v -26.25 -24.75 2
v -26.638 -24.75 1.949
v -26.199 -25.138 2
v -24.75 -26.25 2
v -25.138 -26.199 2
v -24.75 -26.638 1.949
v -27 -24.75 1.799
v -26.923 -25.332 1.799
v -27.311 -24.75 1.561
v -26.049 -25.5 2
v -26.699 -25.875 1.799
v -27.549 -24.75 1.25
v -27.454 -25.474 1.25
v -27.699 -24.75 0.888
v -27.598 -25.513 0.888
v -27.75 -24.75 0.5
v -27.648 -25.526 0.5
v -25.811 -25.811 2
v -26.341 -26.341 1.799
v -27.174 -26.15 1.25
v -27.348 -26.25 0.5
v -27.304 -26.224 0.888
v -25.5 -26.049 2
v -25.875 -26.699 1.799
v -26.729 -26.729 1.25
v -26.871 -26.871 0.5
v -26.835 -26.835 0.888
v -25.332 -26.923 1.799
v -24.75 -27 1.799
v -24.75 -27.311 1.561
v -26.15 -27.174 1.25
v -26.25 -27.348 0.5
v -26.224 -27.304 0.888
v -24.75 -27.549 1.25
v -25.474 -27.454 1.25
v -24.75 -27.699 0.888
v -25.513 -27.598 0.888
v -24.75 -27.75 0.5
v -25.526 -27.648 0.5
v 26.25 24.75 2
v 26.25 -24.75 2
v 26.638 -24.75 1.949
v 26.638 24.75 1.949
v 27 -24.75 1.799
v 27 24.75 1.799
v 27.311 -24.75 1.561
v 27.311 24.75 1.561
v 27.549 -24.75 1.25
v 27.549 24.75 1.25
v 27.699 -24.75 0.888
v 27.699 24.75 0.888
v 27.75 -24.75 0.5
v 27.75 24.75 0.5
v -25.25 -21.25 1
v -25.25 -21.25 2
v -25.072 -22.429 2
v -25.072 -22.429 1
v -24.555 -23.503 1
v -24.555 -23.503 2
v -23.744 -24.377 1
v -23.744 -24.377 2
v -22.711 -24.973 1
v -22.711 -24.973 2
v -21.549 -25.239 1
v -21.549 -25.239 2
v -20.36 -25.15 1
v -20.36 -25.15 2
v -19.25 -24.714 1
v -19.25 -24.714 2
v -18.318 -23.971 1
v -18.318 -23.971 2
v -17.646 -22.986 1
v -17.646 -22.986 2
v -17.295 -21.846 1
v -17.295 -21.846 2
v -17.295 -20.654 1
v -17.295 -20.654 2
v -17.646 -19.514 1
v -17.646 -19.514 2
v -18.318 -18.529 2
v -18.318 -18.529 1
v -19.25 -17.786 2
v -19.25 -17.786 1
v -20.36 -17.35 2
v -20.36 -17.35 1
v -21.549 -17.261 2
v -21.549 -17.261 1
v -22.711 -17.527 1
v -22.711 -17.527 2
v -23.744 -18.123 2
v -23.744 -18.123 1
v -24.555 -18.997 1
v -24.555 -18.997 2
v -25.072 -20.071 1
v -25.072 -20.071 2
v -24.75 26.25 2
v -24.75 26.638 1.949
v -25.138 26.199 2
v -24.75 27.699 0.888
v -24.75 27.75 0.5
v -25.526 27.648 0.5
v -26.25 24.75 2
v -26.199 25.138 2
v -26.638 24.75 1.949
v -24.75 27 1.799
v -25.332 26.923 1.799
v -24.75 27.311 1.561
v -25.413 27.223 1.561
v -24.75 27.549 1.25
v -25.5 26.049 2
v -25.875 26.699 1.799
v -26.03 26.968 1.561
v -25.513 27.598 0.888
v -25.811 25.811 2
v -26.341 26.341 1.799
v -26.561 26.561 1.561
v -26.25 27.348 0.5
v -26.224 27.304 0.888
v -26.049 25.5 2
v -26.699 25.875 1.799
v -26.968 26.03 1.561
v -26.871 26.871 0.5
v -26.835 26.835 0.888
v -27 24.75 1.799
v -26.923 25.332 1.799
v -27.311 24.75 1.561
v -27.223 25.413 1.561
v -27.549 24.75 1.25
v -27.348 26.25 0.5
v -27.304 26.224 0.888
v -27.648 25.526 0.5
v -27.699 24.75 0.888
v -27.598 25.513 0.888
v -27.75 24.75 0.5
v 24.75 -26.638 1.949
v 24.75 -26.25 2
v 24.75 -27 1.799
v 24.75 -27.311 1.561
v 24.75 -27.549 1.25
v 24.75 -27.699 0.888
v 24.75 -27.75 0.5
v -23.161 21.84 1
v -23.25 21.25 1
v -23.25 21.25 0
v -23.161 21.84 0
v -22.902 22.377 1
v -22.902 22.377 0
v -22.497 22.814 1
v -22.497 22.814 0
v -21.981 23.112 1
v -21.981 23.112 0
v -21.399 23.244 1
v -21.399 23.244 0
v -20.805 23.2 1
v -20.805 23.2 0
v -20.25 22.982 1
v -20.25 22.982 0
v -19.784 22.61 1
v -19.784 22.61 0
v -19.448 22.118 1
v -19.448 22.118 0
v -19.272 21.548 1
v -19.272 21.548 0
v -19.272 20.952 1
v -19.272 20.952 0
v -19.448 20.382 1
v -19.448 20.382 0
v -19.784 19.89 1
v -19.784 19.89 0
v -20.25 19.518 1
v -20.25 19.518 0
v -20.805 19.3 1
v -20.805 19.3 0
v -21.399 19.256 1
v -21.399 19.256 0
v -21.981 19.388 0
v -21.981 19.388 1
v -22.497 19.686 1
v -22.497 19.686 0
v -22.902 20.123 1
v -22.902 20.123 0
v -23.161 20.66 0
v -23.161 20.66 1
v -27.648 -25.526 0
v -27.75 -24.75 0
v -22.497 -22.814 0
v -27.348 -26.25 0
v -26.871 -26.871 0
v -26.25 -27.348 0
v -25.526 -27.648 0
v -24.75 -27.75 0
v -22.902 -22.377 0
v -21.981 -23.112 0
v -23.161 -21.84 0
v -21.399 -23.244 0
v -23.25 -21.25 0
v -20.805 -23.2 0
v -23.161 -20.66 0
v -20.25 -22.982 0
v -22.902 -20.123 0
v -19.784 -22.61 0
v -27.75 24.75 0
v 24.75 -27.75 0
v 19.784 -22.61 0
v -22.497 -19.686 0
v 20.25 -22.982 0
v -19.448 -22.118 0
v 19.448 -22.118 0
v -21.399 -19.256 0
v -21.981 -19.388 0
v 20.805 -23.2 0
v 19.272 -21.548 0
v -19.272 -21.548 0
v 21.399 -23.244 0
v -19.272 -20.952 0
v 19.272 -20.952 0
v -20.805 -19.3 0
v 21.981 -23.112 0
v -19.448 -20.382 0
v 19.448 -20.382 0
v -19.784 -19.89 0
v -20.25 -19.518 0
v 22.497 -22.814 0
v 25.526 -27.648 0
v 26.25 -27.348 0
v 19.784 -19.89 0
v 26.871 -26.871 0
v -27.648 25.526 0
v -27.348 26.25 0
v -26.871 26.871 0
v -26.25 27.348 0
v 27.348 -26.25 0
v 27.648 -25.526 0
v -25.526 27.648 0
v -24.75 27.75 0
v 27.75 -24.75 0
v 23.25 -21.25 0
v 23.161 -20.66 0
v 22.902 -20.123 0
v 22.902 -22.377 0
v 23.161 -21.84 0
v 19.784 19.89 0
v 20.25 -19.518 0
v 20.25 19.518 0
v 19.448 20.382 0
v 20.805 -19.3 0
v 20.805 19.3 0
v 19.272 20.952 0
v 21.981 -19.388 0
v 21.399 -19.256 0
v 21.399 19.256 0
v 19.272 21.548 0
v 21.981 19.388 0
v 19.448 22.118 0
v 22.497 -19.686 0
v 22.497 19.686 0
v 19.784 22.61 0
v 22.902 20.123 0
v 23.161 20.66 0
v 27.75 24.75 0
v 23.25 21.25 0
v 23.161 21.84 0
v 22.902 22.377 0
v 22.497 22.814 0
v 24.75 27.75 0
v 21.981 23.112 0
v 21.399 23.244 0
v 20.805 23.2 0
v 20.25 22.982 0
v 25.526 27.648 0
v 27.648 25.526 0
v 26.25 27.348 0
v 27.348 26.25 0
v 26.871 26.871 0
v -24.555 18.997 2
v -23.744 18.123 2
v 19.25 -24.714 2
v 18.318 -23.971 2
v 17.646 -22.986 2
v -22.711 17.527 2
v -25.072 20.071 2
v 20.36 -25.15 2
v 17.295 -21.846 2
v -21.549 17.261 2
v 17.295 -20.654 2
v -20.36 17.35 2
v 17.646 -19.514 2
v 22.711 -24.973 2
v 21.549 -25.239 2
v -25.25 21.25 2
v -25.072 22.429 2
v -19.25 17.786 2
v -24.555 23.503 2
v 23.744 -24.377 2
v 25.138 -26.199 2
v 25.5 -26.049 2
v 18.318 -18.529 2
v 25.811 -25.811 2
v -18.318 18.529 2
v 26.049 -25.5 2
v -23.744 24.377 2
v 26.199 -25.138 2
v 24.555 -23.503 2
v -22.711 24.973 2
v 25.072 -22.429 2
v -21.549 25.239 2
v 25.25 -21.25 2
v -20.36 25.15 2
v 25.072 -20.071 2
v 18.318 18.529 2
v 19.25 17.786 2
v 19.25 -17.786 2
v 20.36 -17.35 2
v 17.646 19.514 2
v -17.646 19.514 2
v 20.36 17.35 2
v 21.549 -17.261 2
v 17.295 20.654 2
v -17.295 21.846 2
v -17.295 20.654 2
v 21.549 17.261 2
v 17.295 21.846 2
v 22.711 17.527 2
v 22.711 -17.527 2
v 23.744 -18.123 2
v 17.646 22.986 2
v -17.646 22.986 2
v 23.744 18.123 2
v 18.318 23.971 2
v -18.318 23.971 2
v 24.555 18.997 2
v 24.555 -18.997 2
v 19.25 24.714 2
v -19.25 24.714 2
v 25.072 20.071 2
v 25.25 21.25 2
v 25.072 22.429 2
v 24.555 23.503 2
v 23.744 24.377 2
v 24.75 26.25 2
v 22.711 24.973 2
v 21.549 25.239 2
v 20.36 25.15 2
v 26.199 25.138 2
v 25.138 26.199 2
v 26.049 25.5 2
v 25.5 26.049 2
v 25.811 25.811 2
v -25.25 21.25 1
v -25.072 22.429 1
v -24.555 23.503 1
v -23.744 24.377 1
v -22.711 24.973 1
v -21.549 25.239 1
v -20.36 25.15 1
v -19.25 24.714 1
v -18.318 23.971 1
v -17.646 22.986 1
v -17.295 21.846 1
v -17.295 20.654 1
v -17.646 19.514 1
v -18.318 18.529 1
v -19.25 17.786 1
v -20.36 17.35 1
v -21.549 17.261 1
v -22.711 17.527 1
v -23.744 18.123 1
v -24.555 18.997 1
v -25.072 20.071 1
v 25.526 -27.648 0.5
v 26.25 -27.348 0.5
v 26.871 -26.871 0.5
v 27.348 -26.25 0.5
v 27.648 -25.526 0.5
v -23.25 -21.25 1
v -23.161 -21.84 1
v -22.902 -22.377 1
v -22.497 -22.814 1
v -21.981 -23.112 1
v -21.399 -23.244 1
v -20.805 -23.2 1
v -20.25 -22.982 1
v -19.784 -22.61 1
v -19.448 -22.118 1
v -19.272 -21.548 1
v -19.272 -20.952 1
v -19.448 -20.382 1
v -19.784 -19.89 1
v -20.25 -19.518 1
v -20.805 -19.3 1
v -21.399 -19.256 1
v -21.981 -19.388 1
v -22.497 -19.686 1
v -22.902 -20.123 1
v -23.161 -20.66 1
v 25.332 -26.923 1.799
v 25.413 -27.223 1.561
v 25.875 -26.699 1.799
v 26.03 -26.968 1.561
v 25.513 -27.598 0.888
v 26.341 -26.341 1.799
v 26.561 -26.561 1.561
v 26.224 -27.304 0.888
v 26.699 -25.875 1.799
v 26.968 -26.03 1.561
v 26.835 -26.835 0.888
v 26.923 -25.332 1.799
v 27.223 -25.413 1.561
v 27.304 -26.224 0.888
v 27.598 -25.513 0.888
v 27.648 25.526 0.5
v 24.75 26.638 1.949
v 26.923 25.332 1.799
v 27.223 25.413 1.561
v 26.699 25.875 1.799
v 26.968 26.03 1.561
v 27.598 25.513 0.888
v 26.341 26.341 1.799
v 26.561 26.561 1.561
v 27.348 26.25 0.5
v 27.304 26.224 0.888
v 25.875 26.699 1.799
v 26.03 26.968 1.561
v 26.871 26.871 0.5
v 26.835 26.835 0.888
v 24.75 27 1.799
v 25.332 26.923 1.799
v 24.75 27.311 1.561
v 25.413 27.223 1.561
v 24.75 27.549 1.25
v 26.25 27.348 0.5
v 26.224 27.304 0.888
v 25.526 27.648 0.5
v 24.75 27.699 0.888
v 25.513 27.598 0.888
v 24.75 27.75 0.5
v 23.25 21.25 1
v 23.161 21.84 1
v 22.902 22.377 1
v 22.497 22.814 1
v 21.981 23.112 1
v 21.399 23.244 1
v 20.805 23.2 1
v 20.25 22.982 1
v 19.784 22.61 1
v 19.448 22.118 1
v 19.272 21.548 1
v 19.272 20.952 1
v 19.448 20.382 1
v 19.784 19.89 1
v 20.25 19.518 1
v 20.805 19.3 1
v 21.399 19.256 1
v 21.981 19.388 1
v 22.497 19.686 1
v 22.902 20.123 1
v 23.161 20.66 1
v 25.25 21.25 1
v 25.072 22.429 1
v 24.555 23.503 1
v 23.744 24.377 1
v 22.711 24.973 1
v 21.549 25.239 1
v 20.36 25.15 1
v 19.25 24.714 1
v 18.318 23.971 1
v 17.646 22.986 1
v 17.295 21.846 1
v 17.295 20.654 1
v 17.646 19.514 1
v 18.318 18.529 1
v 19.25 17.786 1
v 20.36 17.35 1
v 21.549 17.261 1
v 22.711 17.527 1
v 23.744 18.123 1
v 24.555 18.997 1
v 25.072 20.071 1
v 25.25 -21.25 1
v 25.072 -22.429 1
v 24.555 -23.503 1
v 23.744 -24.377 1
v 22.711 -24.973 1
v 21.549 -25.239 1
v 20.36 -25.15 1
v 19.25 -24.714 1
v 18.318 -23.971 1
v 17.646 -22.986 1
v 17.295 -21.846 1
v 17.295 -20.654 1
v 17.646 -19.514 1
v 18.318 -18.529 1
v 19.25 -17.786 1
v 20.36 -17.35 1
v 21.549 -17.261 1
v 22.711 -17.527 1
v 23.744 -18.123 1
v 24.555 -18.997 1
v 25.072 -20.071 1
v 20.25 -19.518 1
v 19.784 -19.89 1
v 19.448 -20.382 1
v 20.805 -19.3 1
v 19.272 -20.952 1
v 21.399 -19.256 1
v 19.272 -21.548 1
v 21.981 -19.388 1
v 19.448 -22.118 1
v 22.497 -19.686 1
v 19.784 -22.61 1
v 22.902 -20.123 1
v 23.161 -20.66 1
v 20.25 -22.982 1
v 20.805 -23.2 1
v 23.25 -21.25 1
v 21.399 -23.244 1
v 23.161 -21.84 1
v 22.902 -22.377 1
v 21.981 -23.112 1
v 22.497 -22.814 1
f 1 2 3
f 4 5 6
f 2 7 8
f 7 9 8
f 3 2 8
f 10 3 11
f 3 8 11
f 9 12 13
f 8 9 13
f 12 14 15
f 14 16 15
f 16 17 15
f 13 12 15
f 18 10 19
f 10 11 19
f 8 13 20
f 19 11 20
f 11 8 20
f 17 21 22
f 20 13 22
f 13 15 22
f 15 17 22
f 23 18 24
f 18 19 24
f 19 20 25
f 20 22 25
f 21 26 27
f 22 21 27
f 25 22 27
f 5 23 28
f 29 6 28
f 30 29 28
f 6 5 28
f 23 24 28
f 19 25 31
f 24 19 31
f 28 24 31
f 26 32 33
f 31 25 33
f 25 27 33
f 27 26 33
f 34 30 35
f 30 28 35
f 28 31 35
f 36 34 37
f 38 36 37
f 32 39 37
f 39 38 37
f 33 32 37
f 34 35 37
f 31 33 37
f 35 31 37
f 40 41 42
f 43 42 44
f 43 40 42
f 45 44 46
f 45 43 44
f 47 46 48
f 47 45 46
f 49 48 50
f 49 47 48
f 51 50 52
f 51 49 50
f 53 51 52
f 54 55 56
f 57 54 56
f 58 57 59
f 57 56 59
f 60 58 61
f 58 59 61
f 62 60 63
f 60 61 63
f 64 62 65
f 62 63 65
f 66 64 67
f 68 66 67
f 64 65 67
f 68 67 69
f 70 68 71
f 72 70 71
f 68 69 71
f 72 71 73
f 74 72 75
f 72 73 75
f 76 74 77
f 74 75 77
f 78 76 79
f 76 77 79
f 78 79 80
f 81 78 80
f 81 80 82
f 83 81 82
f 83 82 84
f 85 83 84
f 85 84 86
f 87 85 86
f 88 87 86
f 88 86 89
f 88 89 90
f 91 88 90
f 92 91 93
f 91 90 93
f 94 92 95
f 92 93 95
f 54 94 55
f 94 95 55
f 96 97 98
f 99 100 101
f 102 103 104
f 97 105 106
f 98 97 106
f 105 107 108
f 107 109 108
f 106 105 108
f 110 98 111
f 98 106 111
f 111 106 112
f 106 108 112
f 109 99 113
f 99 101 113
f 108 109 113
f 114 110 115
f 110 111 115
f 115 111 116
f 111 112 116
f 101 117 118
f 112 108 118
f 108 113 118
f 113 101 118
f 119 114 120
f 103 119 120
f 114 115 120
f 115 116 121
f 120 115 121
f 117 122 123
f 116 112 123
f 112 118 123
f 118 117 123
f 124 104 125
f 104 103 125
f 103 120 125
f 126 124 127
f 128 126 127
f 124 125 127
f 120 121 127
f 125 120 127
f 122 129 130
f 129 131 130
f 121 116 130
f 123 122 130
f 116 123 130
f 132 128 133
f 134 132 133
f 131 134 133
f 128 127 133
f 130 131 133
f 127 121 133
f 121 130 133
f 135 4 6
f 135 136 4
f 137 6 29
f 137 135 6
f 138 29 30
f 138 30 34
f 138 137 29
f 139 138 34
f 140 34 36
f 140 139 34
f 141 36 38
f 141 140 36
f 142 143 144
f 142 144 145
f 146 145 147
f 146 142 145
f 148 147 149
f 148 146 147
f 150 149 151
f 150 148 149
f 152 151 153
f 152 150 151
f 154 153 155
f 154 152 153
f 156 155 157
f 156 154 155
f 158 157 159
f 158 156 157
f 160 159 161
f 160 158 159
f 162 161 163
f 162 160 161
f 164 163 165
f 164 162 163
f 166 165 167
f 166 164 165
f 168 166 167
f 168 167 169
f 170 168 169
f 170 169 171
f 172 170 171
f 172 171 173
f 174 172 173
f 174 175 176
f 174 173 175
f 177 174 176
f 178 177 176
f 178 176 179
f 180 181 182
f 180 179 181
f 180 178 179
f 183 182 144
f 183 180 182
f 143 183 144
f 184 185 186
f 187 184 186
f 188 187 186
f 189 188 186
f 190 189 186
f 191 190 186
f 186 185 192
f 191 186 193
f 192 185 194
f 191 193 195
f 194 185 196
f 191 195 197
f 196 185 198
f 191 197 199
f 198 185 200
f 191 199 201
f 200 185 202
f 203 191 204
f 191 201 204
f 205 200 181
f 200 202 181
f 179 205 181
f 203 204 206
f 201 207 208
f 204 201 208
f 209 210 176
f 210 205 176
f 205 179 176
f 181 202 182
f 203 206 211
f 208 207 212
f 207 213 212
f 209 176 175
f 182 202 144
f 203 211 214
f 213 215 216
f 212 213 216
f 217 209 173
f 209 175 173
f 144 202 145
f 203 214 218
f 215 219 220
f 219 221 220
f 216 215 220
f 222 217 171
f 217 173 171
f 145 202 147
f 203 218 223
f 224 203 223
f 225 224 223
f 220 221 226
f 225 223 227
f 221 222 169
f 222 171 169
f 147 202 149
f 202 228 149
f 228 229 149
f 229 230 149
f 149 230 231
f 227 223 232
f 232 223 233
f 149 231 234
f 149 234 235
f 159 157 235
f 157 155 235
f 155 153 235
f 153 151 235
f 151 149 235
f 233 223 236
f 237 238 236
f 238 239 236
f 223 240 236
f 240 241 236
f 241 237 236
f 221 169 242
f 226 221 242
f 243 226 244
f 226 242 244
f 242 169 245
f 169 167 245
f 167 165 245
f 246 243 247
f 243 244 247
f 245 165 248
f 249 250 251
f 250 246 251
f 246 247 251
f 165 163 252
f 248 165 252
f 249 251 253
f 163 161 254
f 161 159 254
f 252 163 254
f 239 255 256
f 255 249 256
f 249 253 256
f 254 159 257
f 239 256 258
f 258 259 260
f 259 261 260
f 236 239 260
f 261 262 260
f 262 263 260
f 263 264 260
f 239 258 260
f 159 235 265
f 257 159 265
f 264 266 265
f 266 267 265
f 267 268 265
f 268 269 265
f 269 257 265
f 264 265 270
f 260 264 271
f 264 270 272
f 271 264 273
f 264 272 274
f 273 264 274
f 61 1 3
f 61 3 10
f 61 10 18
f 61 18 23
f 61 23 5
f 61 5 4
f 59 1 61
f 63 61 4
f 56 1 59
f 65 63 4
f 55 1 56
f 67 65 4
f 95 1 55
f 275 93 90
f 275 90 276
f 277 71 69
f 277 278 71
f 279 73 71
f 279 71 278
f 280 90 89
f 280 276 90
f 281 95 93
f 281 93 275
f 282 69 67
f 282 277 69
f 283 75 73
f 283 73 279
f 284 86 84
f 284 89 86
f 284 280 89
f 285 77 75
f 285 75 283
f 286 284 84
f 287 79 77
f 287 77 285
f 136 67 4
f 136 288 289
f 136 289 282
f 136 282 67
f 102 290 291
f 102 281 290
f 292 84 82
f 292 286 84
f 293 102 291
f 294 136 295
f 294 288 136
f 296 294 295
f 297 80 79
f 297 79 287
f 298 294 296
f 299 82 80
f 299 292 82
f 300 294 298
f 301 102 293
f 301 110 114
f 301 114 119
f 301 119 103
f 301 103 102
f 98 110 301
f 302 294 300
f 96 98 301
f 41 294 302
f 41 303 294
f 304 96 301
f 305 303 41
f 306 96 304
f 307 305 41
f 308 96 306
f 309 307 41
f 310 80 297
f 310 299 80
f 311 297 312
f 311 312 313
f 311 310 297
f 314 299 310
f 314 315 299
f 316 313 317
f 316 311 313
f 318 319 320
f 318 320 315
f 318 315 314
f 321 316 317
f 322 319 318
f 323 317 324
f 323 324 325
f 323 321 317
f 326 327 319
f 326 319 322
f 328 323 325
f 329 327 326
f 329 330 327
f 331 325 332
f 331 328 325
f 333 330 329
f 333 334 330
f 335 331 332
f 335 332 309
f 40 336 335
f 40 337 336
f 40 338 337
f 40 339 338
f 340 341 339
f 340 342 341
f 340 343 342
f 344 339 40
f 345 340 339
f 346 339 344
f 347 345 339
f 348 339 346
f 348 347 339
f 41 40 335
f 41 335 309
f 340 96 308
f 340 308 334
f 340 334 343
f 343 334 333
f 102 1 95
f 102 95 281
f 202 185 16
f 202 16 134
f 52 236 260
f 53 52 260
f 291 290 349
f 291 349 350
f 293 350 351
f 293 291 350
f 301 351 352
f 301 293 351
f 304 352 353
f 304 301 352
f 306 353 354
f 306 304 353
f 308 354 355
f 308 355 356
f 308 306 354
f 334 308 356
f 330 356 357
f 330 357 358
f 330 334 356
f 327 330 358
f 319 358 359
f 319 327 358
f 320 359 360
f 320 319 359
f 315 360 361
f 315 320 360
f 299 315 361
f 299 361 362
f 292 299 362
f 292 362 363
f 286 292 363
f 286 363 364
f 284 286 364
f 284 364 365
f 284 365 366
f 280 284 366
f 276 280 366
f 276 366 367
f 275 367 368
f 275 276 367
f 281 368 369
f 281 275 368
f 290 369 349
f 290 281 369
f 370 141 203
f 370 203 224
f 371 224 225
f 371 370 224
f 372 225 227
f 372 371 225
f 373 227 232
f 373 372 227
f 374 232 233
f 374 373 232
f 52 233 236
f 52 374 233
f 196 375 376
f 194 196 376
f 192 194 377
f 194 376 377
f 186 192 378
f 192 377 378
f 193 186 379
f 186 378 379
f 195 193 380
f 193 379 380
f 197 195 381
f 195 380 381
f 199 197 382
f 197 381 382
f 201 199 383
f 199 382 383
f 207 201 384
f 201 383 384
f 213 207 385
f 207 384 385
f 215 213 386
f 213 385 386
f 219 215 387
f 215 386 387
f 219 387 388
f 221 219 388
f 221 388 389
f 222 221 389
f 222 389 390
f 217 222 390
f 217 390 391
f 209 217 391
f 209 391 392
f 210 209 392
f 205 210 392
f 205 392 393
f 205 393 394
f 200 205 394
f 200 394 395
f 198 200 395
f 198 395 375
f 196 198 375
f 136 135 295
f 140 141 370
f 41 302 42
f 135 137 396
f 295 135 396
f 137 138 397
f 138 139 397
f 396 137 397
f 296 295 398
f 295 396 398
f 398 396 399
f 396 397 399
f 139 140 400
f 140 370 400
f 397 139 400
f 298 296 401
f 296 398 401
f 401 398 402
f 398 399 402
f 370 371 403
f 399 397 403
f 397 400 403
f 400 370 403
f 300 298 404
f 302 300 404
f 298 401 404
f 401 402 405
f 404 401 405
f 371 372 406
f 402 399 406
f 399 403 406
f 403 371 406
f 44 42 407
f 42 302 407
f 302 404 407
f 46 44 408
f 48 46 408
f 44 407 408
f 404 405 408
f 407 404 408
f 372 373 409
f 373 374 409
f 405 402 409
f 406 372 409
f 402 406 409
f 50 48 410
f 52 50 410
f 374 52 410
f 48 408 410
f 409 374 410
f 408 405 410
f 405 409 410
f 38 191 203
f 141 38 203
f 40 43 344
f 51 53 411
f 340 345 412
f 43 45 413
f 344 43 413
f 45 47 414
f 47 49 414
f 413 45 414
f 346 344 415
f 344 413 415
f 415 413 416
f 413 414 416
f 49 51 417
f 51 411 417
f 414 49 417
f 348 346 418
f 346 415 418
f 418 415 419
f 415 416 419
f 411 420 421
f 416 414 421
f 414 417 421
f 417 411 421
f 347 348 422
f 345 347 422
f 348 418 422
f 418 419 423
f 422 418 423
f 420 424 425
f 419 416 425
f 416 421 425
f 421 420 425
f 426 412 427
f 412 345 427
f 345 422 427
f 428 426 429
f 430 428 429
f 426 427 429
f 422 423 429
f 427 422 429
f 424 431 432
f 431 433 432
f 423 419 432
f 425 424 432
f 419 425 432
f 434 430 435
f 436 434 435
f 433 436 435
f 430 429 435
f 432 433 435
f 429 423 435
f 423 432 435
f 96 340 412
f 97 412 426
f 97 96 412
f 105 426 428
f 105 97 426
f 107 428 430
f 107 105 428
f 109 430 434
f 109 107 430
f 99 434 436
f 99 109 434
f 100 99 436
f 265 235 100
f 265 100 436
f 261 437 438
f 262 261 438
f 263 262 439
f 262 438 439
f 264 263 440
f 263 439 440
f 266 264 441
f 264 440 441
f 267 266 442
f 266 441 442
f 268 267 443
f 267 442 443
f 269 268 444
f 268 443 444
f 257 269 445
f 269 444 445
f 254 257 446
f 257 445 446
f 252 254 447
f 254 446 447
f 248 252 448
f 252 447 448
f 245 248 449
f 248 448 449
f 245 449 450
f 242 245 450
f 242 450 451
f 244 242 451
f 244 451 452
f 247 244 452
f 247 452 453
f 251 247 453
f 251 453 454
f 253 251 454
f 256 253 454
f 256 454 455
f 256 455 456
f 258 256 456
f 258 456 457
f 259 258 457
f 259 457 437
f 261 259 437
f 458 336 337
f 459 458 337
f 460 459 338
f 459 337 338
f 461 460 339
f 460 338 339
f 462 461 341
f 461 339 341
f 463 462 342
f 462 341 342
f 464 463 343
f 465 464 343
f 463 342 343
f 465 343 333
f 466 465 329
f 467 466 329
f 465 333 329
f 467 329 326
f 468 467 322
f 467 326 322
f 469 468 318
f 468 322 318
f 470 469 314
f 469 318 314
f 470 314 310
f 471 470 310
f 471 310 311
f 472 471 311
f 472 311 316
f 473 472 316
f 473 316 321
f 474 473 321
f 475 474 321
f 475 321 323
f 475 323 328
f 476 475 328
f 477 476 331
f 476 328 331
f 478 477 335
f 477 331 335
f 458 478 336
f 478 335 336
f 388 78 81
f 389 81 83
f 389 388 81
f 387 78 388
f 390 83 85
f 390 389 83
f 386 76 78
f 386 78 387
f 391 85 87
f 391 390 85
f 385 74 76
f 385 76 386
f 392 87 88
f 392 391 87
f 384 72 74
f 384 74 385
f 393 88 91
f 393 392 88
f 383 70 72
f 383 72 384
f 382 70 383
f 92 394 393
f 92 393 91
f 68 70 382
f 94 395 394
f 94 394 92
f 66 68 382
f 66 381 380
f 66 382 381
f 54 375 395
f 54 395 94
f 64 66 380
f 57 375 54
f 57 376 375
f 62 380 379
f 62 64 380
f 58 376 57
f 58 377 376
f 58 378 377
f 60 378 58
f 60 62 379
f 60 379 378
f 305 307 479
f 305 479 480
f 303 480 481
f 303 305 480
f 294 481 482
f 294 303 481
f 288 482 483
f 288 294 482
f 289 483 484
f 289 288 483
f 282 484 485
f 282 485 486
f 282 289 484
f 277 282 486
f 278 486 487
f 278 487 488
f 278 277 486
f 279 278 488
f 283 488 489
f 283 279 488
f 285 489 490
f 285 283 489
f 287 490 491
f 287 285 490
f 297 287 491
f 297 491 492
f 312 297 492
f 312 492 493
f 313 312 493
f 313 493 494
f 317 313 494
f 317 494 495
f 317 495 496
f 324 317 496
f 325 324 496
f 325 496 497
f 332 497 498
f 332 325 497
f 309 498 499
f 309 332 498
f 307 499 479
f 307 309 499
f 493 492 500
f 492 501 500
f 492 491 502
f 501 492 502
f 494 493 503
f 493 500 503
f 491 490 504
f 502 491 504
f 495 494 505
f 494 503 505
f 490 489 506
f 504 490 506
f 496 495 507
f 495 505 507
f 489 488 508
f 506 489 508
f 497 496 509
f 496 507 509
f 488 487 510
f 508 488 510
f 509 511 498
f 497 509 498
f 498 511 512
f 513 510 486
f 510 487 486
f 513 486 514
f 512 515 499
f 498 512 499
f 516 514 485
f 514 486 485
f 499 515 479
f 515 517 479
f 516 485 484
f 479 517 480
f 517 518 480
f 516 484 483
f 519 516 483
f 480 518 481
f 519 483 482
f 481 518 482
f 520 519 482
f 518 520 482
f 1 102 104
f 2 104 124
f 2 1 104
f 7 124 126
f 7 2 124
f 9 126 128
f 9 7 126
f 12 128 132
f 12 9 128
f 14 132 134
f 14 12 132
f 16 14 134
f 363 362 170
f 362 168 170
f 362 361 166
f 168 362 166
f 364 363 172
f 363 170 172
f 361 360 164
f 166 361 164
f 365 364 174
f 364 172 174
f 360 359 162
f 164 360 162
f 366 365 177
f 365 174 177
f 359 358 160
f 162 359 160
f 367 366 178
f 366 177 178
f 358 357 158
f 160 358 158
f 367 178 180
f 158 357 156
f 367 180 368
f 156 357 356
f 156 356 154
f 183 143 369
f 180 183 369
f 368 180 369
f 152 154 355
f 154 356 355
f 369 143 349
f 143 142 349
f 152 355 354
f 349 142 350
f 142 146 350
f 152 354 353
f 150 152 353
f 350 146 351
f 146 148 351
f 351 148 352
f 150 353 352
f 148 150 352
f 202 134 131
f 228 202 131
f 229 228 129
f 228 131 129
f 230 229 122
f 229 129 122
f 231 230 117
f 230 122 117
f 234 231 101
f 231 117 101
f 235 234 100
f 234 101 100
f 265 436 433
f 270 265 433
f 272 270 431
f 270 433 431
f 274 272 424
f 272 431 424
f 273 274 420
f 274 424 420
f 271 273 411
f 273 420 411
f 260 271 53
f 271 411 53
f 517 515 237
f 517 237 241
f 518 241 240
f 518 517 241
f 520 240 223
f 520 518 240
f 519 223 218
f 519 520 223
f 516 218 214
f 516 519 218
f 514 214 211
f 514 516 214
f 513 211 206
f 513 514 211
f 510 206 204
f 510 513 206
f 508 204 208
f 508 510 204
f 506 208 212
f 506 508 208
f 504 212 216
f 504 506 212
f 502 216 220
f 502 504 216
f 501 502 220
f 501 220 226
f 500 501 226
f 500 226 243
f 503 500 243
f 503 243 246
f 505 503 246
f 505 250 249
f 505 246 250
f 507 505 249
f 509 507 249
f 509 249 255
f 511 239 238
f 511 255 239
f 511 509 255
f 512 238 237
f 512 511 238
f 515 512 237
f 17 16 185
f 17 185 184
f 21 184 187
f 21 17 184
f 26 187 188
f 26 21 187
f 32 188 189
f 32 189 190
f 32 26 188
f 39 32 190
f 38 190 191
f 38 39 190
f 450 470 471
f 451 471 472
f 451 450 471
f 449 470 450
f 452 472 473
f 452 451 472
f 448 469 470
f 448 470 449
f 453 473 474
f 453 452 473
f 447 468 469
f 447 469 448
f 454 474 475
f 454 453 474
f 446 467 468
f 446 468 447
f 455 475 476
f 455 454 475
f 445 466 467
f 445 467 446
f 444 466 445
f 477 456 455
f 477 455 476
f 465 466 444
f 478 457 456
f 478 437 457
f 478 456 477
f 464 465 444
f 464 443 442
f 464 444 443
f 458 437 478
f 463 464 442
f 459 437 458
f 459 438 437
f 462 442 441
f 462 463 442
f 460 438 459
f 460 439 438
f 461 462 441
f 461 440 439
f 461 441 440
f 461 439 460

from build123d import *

# Parameters (mm, degrees)
SKETCH_W                   = 55.5
SKETCH_H                   = 55.5
PAD_DEPTH                  = 2
SKETCH001_R                = 2
POCKET_DEPTH               = 159.02966
SKETCH002_R                = 4
POCKET001_DEPTH            = 1
SKETCH001_MIRRORED_2_R     = 2
POCKET_MIRRORED_2_DEPTH    = 159.02966
SKETCH002_MIRRORED_2_R     = 4
POCKET001_MIRRORED_2_DEPTH = 1
FILLET_R                   = 3
FILLET001_R                = 1.5


with BuildPart() as part:
    # Sketch → Pad (new body)
    with BuildSketch(Plane.XY):
        Rectangle(SKETCH_W, SKETCH_H)
    extrude(amount=PAD_DEPTH)

    # Sketch001 (on Face6 of Pad) → Pocket (cut, through all)
    with BuildSketch(Plane.XY.offset(2)):
        with Locations((21.25, 21.25)):
            Circle(SKETCH001_R)
    pocket = extrude(amount=-POCKET_DEPTH, mode=Mode.SUBTRACT)

    # Sketch002 (on Face5 of Pocket) → Pocket001 (cut)
    with BuildSketch(Plane.XY.offset(2)):
        with Locations((21.25, 21.25)):
            Circle(SKETCH002_R)
    pocket001 = extrude(amount=-POCKET001_DEPTH, mode=Mode.SUBTRACT)

    # Sketch001 Mirrored 2 → Pocket Mirrored 2 (cut, through all)
    with BuildSketch(Plane(origin=(0, 0, 2), x_dir=(-1, 0, 0), z_dir=(0, 0, -1))):
        with Locations((21.25, 21.25)):
            Circle(SKETCH001_MIRRORED_2_R)
    pocket_mirrored_2 = extrude(amount=POCKET_MIRRORED_2_DEPTH, mode=Mode.SUBTRACT)

    # Sketch002 Mirrored 2 → Pocket001 Mirrored 2 (cut)
    with BuildSketch(Plane(origin=(0, 0, 2), x_dir=(-1, 0, 0), z_dir=(0, 0, -1))):
        with Locations((21.25, 21.25)):
            Circle(SKETCH002_MIRRORED_2_R)
    pocket001_mirrored_2 = extrude(amount=POCKET001_MIRRORED_2_DEPTH, mode=Mode.SUBTRACT)

    # Mirrored001: Pocket, Pocket001, Pocket Mirrored 2, Pocket001 Mirrored 2 across Sketch001 H_Axis
    add(pocket.mirror(Plane(origin=(0, 0, 2), x_dir=(0, 0, 1), z_dir=(0, 1, 0))), mode=Mode.SUBTRACT)
    add(pocket001.mirror(Plane(origin=(0, 0, 2), x_dir=(0, 0, 1), z_dir=(0, 1, 0))), mode=Mode.SUBTRACT)
    add(pocket_mirrored_2.mirror(Plane(origin=(0, 0, 2), x_dir=(0, 0, 1), z_dir=(0, 1, 0))), mode=Mode.SUBTRACT)
    add(pocket001_mirrored_2.mirror(Plane(origin=(0, 0, 2), x_dir=(0, 0, 1), z_dir=(0, 1, 0))), mode=Mode.SUBTRACT)

    # Fillet
    fillet_edges = [part.edges().sort_by_distance(p)[0] for p in [
        (-27.75, -27.75, 1),
        (27.75, -27.75, 1),
        (27.75, 27.75, 1),
        (-27.75, 27.75, 1),
    ]]
    fillet(fillet_edges, radius=FILLET_R)

    # Fillet001
    fillet001_edges = [part.edges().sort_by_distance(p)[0] for p in [
        (0, -27.75, 2),
    ]]
    fillet(fillet001_edges, radius=FILLET001_R)


solid = part.part
